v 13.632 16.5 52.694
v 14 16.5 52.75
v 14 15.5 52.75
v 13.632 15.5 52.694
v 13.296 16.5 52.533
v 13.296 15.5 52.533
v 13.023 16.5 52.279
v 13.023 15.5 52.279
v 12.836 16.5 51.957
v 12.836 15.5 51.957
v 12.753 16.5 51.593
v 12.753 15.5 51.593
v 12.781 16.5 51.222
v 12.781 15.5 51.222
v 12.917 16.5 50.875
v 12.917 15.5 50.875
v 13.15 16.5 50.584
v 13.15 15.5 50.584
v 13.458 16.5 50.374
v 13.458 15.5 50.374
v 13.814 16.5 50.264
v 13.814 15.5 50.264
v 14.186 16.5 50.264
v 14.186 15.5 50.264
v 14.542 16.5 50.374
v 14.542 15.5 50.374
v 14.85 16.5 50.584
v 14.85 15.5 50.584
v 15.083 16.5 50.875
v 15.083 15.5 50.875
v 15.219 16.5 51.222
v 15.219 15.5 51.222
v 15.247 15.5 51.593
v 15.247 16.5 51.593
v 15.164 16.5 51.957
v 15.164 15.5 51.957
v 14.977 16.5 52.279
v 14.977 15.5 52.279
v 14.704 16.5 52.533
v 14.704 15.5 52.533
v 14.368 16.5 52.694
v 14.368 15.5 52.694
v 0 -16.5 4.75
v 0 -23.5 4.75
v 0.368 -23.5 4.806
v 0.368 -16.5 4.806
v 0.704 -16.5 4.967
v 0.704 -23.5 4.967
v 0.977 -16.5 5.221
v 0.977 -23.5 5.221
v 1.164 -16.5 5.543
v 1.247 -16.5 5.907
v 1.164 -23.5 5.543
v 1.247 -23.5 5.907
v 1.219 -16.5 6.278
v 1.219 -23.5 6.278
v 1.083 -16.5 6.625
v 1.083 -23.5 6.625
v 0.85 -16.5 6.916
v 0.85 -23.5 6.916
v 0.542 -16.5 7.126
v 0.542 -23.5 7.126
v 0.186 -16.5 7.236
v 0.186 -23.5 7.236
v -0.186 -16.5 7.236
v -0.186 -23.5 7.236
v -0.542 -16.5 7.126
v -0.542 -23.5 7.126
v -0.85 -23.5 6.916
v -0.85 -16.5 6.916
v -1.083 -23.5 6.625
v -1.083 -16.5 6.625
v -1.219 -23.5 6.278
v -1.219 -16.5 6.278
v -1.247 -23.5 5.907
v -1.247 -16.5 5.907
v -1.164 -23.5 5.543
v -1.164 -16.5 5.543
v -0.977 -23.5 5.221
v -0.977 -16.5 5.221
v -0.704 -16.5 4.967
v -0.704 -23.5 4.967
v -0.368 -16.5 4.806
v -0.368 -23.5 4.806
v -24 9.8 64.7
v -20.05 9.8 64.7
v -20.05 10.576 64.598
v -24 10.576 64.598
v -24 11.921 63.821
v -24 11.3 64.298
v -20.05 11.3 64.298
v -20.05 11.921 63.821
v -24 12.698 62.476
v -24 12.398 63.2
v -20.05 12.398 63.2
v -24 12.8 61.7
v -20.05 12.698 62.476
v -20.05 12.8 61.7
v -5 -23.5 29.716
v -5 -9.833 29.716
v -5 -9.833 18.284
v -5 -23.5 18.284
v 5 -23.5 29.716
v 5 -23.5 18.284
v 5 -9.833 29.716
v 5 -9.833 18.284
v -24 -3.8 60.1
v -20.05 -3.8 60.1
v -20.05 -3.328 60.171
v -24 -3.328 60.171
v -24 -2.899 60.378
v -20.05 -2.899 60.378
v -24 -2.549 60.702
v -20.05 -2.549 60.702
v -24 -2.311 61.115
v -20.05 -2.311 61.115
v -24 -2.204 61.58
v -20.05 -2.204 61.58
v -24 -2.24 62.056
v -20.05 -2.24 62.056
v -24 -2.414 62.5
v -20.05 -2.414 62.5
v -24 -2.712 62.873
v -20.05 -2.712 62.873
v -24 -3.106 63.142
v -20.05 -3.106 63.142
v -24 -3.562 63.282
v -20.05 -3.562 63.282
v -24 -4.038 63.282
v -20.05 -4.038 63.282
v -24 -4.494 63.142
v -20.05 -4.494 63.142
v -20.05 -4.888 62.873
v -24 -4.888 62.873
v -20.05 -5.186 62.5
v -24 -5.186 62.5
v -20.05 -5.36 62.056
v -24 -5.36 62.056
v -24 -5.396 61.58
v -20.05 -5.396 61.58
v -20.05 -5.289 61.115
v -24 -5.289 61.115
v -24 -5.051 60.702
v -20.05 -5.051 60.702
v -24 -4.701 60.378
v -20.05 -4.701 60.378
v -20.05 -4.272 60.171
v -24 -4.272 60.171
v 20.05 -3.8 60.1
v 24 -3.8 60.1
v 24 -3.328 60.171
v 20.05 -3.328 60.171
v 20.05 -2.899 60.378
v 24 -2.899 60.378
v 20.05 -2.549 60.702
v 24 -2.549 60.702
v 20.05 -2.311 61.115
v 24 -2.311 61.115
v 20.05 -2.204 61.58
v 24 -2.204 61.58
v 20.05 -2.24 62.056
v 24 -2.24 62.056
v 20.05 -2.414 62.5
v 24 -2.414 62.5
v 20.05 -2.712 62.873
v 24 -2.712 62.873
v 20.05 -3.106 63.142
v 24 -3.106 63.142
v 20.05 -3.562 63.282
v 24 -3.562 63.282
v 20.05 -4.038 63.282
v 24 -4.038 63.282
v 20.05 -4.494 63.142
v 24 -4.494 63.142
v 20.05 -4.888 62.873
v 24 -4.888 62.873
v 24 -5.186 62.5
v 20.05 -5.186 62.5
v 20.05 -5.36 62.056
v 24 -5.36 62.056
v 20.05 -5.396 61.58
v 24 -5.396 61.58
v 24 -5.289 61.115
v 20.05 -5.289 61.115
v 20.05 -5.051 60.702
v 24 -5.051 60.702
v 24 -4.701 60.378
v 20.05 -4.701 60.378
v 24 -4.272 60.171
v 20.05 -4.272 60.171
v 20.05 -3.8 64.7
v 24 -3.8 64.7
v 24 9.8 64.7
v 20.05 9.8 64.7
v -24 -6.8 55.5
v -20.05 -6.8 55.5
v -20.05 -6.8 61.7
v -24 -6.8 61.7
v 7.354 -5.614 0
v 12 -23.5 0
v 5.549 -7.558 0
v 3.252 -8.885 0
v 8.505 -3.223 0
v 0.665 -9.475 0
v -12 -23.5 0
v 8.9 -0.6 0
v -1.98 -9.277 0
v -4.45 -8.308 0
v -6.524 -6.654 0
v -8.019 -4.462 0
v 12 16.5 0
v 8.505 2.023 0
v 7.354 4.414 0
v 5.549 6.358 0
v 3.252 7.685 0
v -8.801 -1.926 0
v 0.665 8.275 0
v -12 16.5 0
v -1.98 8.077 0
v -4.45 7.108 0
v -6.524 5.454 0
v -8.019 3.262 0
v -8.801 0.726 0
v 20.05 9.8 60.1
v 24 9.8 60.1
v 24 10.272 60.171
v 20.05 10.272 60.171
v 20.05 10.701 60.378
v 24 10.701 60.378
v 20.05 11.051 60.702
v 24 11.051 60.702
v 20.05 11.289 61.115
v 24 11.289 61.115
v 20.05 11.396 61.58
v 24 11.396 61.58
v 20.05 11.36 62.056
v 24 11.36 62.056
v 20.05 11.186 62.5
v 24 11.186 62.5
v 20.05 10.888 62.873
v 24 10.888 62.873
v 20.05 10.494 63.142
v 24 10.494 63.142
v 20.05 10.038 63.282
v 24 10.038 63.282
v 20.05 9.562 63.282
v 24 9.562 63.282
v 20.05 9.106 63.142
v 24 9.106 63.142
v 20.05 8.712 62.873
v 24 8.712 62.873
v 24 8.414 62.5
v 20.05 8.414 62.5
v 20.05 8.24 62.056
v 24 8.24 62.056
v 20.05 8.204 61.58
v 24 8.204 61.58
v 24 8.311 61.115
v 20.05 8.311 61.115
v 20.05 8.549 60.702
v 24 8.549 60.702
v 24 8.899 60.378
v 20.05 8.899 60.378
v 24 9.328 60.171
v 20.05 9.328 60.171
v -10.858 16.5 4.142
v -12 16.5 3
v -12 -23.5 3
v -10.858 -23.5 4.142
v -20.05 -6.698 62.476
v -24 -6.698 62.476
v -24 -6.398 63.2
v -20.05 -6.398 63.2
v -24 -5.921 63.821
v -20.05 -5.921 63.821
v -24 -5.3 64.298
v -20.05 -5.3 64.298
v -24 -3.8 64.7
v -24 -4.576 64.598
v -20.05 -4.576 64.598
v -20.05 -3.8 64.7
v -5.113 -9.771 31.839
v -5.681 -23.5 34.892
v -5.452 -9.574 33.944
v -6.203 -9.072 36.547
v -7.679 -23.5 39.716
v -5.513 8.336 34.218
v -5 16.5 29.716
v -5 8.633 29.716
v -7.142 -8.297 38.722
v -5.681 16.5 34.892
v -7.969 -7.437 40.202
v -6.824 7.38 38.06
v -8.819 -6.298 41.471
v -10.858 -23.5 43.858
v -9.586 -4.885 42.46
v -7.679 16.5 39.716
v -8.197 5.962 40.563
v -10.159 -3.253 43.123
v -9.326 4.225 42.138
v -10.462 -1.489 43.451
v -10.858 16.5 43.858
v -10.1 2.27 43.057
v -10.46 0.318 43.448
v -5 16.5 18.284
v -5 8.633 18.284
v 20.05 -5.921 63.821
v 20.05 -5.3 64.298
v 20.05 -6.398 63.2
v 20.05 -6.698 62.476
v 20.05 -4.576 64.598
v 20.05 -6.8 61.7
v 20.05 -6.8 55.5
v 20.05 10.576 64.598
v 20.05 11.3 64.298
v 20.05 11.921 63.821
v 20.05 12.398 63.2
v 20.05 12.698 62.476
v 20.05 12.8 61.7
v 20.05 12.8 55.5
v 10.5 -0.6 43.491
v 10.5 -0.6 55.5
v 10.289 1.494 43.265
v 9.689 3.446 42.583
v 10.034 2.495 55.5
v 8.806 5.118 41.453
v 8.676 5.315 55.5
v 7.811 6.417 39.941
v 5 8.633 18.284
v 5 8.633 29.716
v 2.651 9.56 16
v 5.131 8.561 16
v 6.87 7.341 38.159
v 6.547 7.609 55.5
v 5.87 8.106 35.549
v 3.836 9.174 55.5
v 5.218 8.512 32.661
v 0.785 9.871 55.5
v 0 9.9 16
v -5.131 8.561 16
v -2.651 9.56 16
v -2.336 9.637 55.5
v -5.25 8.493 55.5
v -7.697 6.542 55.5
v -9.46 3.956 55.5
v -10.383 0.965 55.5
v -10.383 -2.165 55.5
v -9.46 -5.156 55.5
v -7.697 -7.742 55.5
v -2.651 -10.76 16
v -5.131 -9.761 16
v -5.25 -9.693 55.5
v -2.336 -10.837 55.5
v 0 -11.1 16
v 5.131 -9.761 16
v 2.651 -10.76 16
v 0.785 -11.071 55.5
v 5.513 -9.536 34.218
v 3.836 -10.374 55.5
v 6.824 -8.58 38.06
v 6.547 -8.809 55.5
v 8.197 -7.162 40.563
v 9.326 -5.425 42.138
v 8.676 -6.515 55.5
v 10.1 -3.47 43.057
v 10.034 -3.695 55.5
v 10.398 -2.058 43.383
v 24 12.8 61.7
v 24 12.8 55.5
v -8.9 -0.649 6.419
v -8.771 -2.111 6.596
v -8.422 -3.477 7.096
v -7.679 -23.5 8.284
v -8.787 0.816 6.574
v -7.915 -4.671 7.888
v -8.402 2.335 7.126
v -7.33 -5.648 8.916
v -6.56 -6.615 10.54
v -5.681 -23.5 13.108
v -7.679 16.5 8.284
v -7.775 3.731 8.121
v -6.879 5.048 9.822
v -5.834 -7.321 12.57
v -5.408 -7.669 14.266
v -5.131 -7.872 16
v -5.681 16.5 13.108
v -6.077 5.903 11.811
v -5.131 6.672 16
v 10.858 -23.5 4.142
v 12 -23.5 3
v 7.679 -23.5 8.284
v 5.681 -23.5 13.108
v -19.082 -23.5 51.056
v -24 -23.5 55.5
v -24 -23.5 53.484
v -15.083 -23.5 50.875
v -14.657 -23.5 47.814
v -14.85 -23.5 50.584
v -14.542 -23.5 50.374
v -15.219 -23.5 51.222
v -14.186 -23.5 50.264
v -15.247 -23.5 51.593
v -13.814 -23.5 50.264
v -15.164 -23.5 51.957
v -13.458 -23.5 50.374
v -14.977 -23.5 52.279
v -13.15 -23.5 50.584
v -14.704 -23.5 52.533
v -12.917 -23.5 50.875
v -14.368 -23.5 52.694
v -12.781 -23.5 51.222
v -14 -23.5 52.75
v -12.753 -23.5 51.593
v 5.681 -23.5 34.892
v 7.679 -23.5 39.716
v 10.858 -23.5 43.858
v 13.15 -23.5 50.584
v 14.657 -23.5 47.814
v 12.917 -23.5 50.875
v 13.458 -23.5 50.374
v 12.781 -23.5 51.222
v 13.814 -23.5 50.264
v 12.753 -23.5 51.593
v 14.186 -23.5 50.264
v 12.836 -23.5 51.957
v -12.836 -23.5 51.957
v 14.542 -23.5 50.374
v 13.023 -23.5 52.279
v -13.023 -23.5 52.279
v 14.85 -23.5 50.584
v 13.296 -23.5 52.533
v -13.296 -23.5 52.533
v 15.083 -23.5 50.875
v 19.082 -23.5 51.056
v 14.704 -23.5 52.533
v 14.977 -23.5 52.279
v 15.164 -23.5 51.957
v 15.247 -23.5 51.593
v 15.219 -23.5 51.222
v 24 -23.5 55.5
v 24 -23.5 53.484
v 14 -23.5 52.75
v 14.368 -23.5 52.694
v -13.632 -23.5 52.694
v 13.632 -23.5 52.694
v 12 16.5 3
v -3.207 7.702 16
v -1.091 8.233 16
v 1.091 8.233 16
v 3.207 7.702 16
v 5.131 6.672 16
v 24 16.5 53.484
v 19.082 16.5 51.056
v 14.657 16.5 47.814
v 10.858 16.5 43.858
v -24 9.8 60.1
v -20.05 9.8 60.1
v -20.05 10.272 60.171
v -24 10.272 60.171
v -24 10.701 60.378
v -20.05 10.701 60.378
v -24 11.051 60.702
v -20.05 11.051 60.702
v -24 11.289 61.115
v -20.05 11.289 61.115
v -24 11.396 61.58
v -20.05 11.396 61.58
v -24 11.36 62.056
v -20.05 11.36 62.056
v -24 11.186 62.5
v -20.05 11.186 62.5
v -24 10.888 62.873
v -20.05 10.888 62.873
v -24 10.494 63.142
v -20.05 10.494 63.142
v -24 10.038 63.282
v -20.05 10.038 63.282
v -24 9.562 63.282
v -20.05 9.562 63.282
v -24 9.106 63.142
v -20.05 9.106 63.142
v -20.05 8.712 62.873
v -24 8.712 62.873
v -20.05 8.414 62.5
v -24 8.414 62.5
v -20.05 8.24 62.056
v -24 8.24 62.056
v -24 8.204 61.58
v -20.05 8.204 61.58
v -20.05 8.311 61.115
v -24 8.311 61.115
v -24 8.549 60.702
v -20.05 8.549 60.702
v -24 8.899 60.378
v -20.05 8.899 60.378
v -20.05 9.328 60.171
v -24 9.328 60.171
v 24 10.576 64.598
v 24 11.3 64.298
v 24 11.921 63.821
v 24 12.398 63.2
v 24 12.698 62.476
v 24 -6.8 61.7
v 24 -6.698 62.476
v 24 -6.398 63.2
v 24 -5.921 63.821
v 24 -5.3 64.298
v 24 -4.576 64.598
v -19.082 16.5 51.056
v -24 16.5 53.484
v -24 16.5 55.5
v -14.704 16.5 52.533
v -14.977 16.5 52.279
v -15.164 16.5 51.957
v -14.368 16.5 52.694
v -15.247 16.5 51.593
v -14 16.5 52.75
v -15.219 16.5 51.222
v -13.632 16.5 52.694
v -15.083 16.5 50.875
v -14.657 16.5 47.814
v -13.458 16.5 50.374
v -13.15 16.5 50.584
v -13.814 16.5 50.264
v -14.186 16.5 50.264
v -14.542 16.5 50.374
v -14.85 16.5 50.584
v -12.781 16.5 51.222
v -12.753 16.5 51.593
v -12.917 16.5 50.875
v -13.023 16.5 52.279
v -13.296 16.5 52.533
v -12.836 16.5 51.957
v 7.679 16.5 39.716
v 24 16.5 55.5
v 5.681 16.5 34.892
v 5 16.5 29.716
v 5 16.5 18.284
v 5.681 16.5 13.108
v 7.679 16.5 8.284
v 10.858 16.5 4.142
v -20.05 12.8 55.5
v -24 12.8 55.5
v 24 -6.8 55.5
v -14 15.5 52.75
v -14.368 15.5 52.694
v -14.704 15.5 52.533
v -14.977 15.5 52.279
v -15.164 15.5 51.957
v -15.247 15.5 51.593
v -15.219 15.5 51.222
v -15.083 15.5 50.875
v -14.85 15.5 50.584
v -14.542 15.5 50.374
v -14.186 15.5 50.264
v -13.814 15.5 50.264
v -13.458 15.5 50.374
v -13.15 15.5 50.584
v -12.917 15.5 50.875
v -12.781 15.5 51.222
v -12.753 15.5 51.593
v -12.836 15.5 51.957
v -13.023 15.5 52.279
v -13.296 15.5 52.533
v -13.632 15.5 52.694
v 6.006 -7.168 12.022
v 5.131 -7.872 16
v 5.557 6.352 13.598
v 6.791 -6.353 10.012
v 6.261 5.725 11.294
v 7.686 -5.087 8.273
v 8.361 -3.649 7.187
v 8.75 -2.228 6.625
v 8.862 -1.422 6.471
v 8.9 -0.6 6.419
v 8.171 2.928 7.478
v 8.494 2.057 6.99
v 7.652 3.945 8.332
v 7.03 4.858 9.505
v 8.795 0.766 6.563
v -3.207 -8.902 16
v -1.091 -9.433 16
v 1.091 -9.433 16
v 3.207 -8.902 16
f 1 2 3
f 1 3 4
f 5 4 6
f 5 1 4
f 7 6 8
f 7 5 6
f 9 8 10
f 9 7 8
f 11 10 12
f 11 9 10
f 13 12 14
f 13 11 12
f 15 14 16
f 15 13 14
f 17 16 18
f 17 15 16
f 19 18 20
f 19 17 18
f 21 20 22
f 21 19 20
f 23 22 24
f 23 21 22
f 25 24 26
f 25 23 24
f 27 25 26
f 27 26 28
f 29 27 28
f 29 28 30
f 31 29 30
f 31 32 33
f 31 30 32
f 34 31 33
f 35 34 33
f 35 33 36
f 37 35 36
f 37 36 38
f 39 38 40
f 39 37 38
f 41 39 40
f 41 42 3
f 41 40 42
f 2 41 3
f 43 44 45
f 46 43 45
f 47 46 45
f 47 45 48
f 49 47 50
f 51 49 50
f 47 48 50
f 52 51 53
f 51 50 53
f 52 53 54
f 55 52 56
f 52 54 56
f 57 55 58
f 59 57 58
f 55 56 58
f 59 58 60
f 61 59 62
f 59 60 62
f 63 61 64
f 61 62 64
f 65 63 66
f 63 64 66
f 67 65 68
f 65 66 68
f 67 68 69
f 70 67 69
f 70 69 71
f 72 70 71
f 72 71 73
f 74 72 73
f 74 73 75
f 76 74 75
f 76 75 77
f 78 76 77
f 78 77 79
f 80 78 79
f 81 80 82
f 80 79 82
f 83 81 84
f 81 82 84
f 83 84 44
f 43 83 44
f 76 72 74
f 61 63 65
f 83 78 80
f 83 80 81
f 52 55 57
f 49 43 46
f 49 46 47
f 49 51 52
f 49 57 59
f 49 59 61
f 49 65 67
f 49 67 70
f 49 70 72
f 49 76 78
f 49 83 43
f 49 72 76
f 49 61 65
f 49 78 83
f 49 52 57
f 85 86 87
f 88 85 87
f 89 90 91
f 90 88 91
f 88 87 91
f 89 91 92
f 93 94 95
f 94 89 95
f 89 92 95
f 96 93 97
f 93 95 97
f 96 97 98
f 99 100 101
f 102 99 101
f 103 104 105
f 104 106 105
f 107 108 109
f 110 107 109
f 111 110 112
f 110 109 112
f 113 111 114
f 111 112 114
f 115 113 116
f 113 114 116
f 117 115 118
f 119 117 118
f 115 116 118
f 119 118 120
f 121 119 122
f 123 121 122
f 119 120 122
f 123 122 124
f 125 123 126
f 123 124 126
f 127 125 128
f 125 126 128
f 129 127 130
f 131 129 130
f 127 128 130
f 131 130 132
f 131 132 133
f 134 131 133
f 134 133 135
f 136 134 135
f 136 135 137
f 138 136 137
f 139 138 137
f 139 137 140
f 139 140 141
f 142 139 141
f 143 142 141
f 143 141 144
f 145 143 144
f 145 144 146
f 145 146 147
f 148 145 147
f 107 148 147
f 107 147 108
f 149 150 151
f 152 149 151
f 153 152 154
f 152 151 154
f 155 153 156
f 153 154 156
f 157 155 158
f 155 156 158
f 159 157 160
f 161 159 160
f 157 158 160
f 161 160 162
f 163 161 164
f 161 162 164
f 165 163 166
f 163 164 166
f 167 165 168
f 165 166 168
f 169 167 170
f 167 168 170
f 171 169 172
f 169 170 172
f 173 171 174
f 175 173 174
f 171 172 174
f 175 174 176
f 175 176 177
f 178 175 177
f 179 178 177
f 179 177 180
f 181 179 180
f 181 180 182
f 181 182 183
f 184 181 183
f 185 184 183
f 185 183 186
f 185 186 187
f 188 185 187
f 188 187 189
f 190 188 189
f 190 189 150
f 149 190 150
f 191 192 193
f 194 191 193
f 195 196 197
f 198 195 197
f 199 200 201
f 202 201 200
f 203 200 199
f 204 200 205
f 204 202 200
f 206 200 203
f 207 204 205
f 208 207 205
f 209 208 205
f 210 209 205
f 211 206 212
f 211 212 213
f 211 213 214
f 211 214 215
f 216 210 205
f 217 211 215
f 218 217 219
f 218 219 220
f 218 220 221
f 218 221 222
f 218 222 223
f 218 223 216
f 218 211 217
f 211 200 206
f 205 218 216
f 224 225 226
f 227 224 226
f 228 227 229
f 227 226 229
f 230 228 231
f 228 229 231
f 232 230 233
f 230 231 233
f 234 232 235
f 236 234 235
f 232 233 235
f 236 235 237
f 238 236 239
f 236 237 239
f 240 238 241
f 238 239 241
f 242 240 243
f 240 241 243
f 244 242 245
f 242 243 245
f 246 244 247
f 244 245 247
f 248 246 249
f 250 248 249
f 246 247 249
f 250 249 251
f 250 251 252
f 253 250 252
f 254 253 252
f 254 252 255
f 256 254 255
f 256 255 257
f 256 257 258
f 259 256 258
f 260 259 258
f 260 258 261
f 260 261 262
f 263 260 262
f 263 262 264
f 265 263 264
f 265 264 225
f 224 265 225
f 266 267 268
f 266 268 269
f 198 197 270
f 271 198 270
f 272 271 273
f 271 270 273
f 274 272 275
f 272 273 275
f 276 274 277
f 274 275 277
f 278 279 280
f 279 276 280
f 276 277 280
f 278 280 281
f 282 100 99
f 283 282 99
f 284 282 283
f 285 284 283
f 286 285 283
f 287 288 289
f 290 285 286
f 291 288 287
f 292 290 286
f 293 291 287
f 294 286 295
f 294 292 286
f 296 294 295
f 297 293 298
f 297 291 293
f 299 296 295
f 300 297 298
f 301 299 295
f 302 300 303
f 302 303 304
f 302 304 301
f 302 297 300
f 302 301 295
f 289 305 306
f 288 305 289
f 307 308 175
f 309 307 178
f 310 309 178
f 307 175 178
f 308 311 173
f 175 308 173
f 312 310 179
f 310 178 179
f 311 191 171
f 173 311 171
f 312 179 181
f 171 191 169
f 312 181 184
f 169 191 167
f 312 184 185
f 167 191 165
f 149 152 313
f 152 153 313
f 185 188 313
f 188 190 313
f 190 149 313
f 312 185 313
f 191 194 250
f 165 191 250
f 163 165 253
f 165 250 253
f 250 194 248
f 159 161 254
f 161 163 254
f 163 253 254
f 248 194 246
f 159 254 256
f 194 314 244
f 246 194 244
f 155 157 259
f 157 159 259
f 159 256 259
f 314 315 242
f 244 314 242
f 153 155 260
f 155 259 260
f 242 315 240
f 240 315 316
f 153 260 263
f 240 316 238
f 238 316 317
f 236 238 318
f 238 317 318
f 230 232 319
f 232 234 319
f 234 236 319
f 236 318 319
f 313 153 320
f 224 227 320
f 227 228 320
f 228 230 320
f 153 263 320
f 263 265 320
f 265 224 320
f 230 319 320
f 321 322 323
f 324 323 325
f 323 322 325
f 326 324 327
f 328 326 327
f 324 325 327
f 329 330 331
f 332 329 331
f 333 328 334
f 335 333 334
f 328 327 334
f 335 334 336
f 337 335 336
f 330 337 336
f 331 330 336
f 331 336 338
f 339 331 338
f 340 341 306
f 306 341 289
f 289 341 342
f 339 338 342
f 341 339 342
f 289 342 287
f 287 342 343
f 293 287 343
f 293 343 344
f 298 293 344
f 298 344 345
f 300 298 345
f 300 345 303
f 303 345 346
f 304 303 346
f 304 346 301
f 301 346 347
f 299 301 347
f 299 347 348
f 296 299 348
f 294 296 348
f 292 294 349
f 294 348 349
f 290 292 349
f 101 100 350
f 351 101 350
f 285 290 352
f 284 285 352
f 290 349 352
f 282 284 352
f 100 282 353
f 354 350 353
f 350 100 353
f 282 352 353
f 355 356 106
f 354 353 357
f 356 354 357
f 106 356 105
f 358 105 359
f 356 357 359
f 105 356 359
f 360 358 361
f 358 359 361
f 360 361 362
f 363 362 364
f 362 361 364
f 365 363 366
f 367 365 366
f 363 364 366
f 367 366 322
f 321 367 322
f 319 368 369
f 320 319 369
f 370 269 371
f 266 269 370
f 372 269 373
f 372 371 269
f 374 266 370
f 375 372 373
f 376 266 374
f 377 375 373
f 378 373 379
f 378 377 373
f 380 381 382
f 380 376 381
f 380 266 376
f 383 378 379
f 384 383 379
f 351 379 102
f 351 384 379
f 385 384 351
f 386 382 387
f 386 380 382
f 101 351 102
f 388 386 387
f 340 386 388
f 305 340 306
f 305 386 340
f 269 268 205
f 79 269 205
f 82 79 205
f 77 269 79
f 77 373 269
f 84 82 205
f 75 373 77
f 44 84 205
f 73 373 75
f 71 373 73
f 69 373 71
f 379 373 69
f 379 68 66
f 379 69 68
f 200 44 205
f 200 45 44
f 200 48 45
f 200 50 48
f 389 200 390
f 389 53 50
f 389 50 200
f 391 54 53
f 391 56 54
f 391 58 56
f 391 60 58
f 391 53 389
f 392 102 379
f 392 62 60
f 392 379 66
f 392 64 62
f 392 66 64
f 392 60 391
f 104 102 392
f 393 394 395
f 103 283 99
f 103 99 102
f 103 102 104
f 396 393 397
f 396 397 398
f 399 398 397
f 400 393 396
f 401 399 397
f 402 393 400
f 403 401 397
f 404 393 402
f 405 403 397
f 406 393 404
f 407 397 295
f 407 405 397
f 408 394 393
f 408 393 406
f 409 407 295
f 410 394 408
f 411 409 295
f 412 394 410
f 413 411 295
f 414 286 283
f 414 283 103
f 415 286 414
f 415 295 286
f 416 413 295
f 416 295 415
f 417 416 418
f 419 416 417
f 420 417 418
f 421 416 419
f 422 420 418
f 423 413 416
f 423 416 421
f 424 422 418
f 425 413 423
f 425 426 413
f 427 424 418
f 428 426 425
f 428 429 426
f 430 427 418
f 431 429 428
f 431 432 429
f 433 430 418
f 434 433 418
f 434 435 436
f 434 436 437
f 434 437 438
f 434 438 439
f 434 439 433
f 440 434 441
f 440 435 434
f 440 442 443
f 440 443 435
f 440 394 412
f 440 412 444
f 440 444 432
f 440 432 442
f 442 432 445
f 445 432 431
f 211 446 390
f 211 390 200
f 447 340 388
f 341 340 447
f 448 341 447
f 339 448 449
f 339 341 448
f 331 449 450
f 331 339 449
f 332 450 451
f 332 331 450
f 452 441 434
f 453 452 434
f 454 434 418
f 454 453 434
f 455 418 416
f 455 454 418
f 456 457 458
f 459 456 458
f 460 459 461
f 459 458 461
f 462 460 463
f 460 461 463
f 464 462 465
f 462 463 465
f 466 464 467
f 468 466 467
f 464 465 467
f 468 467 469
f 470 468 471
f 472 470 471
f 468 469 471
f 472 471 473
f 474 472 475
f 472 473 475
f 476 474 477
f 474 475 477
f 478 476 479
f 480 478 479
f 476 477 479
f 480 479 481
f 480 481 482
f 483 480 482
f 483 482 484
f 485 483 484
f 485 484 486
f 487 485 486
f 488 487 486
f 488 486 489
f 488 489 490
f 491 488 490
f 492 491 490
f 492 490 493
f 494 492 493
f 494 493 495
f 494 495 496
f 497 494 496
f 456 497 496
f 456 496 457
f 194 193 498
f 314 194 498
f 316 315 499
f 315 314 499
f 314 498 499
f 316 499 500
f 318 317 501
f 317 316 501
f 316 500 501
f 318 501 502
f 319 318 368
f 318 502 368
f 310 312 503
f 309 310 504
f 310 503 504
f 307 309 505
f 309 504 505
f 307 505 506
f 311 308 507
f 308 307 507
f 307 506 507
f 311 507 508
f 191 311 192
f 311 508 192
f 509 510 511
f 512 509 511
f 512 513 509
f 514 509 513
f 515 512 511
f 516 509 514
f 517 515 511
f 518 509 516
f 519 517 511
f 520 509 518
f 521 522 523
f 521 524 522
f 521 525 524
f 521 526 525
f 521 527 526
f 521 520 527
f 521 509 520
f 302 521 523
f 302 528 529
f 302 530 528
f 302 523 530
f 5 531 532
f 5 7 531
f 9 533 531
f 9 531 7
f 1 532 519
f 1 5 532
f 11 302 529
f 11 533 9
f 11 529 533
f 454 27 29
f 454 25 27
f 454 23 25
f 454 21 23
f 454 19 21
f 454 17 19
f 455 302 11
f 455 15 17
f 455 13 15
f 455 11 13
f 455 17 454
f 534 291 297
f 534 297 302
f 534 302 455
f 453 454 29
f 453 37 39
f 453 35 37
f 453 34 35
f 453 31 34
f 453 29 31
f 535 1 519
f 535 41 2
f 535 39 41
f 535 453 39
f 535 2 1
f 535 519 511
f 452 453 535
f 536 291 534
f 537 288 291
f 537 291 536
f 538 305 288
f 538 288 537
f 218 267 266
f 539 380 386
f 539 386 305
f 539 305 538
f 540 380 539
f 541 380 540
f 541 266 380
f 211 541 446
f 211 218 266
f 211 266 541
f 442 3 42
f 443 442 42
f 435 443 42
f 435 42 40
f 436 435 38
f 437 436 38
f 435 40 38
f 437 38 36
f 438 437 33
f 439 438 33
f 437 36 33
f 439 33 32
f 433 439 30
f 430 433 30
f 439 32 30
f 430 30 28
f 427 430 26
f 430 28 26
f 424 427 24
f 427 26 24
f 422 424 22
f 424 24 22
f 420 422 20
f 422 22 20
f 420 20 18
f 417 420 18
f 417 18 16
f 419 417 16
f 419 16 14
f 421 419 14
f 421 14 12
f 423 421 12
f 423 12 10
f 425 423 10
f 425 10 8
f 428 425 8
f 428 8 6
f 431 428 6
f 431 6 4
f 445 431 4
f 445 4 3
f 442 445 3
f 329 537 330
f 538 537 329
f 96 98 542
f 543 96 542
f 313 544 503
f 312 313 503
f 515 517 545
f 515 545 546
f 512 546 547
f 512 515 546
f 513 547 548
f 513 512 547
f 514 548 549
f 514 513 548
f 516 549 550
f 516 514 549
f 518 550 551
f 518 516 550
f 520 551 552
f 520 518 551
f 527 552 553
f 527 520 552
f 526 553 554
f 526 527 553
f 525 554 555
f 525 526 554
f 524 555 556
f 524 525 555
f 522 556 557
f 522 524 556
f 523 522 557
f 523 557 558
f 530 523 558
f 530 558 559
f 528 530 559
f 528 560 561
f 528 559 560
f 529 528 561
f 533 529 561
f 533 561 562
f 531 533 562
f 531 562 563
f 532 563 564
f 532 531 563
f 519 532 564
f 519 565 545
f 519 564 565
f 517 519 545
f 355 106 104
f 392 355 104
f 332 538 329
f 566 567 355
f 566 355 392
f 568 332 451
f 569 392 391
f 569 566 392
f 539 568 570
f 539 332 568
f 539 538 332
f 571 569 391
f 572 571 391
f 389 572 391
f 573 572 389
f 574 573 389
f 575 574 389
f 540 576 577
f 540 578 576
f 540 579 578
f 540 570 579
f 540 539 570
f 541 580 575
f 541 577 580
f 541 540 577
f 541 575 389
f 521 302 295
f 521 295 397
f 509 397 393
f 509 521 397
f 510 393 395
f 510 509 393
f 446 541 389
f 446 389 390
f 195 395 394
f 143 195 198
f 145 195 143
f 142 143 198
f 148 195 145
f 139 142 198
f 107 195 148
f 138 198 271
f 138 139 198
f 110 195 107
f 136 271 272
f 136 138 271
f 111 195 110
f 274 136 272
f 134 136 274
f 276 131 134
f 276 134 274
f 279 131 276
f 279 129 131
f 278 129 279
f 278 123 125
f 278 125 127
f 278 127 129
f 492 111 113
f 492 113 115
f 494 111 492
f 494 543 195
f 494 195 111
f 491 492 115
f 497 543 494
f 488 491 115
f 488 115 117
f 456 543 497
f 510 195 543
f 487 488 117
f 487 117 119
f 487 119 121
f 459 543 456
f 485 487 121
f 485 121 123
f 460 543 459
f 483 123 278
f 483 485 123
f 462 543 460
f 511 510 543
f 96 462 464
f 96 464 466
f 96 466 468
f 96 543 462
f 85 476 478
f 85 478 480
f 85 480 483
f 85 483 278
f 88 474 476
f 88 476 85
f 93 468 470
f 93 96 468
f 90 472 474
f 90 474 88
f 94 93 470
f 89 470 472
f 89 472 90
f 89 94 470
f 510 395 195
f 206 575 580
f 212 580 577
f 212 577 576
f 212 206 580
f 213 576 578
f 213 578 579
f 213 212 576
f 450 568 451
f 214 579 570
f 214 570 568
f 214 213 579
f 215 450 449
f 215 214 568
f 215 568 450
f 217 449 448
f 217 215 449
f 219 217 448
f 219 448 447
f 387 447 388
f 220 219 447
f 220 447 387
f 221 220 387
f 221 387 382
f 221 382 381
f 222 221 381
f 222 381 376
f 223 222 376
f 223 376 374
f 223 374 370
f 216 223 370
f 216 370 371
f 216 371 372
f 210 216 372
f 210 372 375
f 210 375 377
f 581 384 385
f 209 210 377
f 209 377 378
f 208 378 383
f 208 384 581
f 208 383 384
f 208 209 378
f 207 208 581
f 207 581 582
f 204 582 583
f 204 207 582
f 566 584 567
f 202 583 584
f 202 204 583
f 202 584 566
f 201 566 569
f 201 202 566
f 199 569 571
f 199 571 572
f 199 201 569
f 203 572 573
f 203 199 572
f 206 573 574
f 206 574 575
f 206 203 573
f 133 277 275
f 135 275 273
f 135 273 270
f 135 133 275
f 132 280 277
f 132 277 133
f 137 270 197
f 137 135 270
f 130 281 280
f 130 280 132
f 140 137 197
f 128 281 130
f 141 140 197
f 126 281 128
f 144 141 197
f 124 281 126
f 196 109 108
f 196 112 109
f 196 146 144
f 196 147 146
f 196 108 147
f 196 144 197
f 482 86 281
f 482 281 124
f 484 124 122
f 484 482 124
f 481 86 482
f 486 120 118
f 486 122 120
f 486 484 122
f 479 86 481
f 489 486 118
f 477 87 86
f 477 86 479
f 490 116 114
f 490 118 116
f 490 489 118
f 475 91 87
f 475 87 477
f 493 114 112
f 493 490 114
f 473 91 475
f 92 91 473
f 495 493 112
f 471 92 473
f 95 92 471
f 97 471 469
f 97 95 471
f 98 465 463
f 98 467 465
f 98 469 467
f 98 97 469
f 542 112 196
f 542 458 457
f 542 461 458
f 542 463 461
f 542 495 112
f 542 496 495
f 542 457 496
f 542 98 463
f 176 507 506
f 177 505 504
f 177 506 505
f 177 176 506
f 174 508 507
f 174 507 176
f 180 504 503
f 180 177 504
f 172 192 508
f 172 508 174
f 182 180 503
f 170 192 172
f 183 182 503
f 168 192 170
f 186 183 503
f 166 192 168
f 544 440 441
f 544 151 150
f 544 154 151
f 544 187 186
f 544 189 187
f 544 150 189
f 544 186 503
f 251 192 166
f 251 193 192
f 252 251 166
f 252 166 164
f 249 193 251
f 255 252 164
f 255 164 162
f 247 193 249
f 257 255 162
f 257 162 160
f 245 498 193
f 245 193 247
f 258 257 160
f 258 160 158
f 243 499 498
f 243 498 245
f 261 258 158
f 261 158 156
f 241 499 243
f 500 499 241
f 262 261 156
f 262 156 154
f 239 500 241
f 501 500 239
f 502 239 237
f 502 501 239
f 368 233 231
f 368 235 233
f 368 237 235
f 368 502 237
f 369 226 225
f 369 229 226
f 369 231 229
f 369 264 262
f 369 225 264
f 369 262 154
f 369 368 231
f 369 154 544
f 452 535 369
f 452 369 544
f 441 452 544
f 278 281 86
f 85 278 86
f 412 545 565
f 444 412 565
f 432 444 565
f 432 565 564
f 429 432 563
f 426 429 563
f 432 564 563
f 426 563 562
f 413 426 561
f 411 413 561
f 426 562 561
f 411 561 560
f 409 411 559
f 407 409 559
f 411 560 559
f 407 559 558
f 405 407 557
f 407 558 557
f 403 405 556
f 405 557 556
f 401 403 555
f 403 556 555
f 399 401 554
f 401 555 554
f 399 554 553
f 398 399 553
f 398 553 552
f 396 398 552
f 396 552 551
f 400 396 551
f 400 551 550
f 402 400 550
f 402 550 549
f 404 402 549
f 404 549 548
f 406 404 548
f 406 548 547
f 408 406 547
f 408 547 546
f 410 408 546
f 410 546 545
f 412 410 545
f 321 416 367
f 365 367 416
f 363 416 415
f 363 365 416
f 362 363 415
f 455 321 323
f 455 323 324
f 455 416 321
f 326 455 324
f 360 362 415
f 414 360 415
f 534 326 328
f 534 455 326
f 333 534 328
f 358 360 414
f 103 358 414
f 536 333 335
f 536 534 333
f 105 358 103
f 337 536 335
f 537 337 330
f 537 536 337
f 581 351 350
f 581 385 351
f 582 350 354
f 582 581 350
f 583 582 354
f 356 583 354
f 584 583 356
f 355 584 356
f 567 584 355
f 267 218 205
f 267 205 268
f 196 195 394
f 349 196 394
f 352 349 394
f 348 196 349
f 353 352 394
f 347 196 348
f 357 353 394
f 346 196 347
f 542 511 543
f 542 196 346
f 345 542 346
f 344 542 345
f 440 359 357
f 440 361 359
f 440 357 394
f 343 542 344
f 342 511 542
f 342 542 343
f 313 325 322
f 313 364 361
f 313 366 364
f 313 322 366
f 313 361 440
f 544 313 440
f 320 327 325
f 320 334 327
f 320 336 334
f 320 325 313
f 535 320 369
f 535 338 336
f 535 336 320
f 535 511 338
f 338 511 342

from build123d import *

# Parameters (mm, degrees)
SKETCH_1_W           = 48
SKETCH_1_H           = 31
SKETCH_1_R           = 8.9
EXTRUDE_1_DEPTH      = 65
SKETCH_2_R           = 10.5
CUT_EXTRUDE_1_DEPTH  = 49
CUT_EXTRUDE_3_DEPTH  = 76.907838857
EXTRUDE_4_DEPTH      = 8
SKETCH_11_R          = 1.25
CUT_EXTRUDE_9_DEPTH  = 80.511005658
SKETCH_15_W          = 40.1
SKETCH_15_H          = 9.5
CUT_EXTRUDE_11_DEPTH = 80.511005658
SKETCH_17_R          = 1.6
CUT_EXTRUDE_13_DEPTH = 85.150163426
SKETCH_19_W          = 3
SKETCH_19_H          = 3
CUT_EXTRUDE_14_DEPTH = 76.651107105
EXTRUDE_5_DEPTH      = 8
EXTRUDE_START        = 1
EXTRUDE_6_DEPTH      = 1
CUT_EXTRUDE_START    = -10
SKETCH_22_R          = 1.25
CUT_EXTRUDE_15_DEPTH = 10
SKETCH_23_R          = 1.25
CUT_EXTRUDE_16_DEPTH = 7


with BuildPart() as part:
    # 草图1 → 凸台-拉伸1 (new body)
    with BuildSketch(Plane.XY):
        Rectangle(SKETCH_1_W, SKETCH_1_H)
        with Locations((0, -0.6)):
            Circle(SKETCH_1_R, mode=Mode.SUBTRACT)
    extrude(amount=EXTRUDE_1_DEPTH)

    # 草图2 → 切除-拉伸1 (cut)
    with BuildSketch(Plane.XY.offset(65)):
        with Locations((0, -0.6)):
            Circle(SKETCH_2_R)
    extrude(amount=-CUT_EXTRUDE_1_DEPTH, mode=Mode.SUBTRACT)

    # 草图4 → 切除-拉伸3 (cut, through all)
    with BuildSketch(Plane(origin=(0, 15.5, 0), x_dir=(1, 0, 0), z_dir=(0, 1, 0))):
        with BuildLine():
            Line((-24, 9), (-10.857864376, -4.142135624))
            ThreePointArc((-10.857864376, -4.142135624), (-6.52240935, -10.6306026), (-5, -18.284271247))
            Line((-5, -18.284271247), (-5, -29.715728753))
            ThreePointArc((-5, -29.715728753), (-6.52240935, -37.3693974), (-10.857864376, -43.857864376))
            ThreePointArc((-10.857864376, -43.857864376), (-16.798925034, -49.531146093), (-24, -53.484226727))
            Line((-24, -53.484226727), (-24, 9))
        make_face()
        with BuildLine():
            Line((5, -18.284271247), (5, -29.715728753))
            ThreePointArc((5, -29.715728753), (6.52240935, -37.3693974), (10.857864376, -43.857864376))
            ThreePointArc((10.857864376, -43.857864376), (16.798925034, -49.531146093), (24, -53.484226727))
            Line((24, -53.484226727), (24, 9))
            Line((24, 9), (10.857864376, -4.142135624))
            ThreePointArc((10.857864376, -4.142135624), (6.52240935, -10.6306026), (5, -18.284271247))
        make_face()
    extrude(amount=-CUT_EXTRUDE_3_DEPTH, mode=Mode.SUBTRACT)

    # 草图12 → 凸台-拉伸4 (add)
    with BuildSketch(Plane.XZ.offset(15.5)):
        with BuildLine():
            Line((-5, 18.284271247), (5, 18.284271247))
            Line((5, 18.284271247), (5, 29.715728753))
            ThreePointArc((5, 29.715728753), (6.52240935, 37.3693974), (10.857864376, 43.857864376))
            ThreePointArc((10.857864376, 43.857864376), (16.798925034, 49.531146093), (24, 53.484226727))
            Line((24, 53.484226727), (24, 65))
            Line((24, 65), (-24, 65))
            Line((-24, 65), (-24, 53.484226727))
            ThreePointArc((-24, 53.484226727), (-16.798925034, 49.531146093), (-10.857864376, 43.857864376))
            ThreePointArc((-10.857864376, 43.857864376), (-6.52240935, 37.3693974), (-5, 29.715728753))
            Line((-5, 29.715728753), (-5, 18.284271247))
        make_face()
    extrude(amount=EXTRUDE_4_DEPTH)

    # 草图11 → 切除-拉伸9 (cut, through all)
    with BuildSketch(Plane(origin=(0, 15.5, 0), x_dir=(1, 0, 0), z_dir=(0, 1, 0))):
        with Locations(Location((14, -51.5, 0), (0, 0, 270))):
            Circle(SKETCH_11_R)
        with Locations(Location((-14, -51.5, 0), (0, 0, 270))):
            Circle(SKETCH_11_R)
    extrude(amount=-CUT_EXTRUDE_9_DEPTH, mode=Mode.SUBTRACT)

    # 草图15 → 切除-拉伸11 (cut, through all)
    with BuildSketch(Plane(origin=(0, 15.5, 0), x_dir=(1, 0, 0), z_dir=(0, 1, 0))):
        with Locations((0, -60.25)):
            Rectangle(SKETCH_15_W, SKETCH_15_H)
    extrude(amount=-CUT_EXTRUDE_11_DEPTH, mode=Mode.SUBTRACT)

    # 草图17 → 切除-拉伸13 (cut, through all)
    with BuildSketch(Plane(origin=(24, 0, 0), x_dir=(0, 0, -1), z_dir=(1, 0, 0))):
        with Locations((-61.7, 9.8)):
            Circle(SKETCH_17_R)
        with Locations((-61.7, -3.8)):
            Circle(SKETCH_17_R)
        with BuildLine():
            Line((-55.5, -23.5), (-55.5, -6.8))
            Line((-55.5, -6.8), (-61.7, -6.8))
            ThreePointArc((-61.7, -6.8), (-63.821320344, -5.921320344), (-64.7, -3.8))
            Line((-64.7, -3.8), (-64.7, 9.8))
            ThreePointArc((-64.7, 9.8), (-63.821320344, 11.921320344), (-61.7, 12.8))
            Line((-61.7, 12.8), (-55.5, 12.8))
            Line((-55.5, 12.8), (-55.5, 15.5))
            Line((-55.5, 15.5), (-64.7, 15.5))
            Line((-64.7, 15.5), (-94.5, 15.5))
            Line((-94.5, 15.5), (-94.5, -23.5))
            Line((-94.5, -23.5), (-55.5, -23.5))
        make_face()
    extrude(amount=-CUT_EXTRUDE_13_DEPTH, mode=Mode.SUBTRACT)

    # 草图19 → 切除-拉伸14 (cut, through all)
    with BuildSketch(Plane.XZ.offset(15.5)):
        with Locations((-13.5, 1.5)):
            Rectangle(SKETCH_19_W, SKETCH_19_H)
        with Locations((13.5, 1.5)):
            Rectangle(SKETCH_19_W, SKETCH_19_H)
    extrude(amount=-CUT_EXTRUDE_14_DEPTH, mode=Mode.SUBTRACT)

    # 草图20 → 凸台-拉伸5 (add)
    with BuildSketch(Plane.XZ.offset(15.5)):
        with BuildLine():
            Line((-10.857864376, 4.142135624), (-12, 3))
            Line((-12, 3), (-12, 0))
            Line((-12, 0), (12, 0))
            Line((12, 0), (12, 3))
            Line((12, 3), (10.857864376, 4.142135624))
            ThreePointArc((10.857864376, 4.142135624), (6.52240935, 10.6306026), (5, 18.284271247))
            Line((5, 18.284271247), (-5, 18.284271247))
            ThreePointArc((-5, 18.284271247), (-6.52240935, 10.6306026), (-10.857864376, 4.142135624))
        make_face()
    extrude(amount=EXTRUDE_5_DEPTH)

    # 草图21 → 凸台-拉伸6 (add)
    with BuildSketch(Plane(origin=(0, 15.5, 0), x_dir=(1, 0, 0), z_dir=(0, 1, 0)).offset(EXTRUDE_START)):
        with BuildLine():
            Line((12, 0), (-12, 0))
            Line((-12, 0), (-12, -3))
            Line((-12, -3), (-10.857864376, -4.142135624))
            ThreePointArc((-10.857864376, -4.142135624), (-6.52240935, -10.6306026), (-5, -18.284271247))
            Line((-5, -18.284271247), (-5, -29.715728753))
            ThreePointArc((-5, -29.715728753), (-6.52240935, -37.3693974), (-10.857864376, -43.857864376))
            ThreePointArc((-10.857864376, -43.857864376), (-16.798925034, -49.531146093), (-24, -53.484226727))
            Line((-24, -53.484226727), (-24, -55.5))
            Line((-24, -55.5), (24, -55.5))
            Line((24, -55.5), (24, -53.484226727))
            ThreePointArc((24, -53.484226727), (16.798925034, -49.531146093), (10.857864376, -43.857864376))
            ThreePointArc((10.857864376, -43.857864376), (6.52240935, -37.3693974), (5, -29.715728753))
            Line((5, -29.715728753), (5, -18.284271247))
            ThreePointArc((5, -18.284271247), (6.52240935, -10.6306026), (10.857864376, -4.142135624))
            Line((10.857864376, -4.142135624), (12, -3))
            Line((12, -3), (12, 0))
        make_face()
    extrude(amount=-EXTRUDE_6_DEPTH)

    # 草图22 → 切除-拉伸15 (cut)
    with BuildSketch(Plane.XZ.offset(-15.5).offset(CUT_EXTRUDE_START)):
        with Locations(Location((-14, 51.5, 0), (0, 0, 90))):
            Circle(SKETCH_22_R)
        with Locations(Location((14, 51.5, 0), (0, 0, 90))):
            Circle(SKETCH_22_R)
    extrude(amount=CUT_EXTRUDE_15_DEPTH, mode=Mode.SUBTRACT)

    # 草图23 → 切除-拉伸16 (cut)
    with BuildSketch(Plane.XZ.offset(23.5)):
        with Locations(Location((0, 6, 0), (0, 0, 270))):
            Circle(SKETCH_23_R)
    extrude(amount=-CUT_EXTRUDE_16_DEPTH, mode=Mode.SUBTRACT)


solid = part.part
